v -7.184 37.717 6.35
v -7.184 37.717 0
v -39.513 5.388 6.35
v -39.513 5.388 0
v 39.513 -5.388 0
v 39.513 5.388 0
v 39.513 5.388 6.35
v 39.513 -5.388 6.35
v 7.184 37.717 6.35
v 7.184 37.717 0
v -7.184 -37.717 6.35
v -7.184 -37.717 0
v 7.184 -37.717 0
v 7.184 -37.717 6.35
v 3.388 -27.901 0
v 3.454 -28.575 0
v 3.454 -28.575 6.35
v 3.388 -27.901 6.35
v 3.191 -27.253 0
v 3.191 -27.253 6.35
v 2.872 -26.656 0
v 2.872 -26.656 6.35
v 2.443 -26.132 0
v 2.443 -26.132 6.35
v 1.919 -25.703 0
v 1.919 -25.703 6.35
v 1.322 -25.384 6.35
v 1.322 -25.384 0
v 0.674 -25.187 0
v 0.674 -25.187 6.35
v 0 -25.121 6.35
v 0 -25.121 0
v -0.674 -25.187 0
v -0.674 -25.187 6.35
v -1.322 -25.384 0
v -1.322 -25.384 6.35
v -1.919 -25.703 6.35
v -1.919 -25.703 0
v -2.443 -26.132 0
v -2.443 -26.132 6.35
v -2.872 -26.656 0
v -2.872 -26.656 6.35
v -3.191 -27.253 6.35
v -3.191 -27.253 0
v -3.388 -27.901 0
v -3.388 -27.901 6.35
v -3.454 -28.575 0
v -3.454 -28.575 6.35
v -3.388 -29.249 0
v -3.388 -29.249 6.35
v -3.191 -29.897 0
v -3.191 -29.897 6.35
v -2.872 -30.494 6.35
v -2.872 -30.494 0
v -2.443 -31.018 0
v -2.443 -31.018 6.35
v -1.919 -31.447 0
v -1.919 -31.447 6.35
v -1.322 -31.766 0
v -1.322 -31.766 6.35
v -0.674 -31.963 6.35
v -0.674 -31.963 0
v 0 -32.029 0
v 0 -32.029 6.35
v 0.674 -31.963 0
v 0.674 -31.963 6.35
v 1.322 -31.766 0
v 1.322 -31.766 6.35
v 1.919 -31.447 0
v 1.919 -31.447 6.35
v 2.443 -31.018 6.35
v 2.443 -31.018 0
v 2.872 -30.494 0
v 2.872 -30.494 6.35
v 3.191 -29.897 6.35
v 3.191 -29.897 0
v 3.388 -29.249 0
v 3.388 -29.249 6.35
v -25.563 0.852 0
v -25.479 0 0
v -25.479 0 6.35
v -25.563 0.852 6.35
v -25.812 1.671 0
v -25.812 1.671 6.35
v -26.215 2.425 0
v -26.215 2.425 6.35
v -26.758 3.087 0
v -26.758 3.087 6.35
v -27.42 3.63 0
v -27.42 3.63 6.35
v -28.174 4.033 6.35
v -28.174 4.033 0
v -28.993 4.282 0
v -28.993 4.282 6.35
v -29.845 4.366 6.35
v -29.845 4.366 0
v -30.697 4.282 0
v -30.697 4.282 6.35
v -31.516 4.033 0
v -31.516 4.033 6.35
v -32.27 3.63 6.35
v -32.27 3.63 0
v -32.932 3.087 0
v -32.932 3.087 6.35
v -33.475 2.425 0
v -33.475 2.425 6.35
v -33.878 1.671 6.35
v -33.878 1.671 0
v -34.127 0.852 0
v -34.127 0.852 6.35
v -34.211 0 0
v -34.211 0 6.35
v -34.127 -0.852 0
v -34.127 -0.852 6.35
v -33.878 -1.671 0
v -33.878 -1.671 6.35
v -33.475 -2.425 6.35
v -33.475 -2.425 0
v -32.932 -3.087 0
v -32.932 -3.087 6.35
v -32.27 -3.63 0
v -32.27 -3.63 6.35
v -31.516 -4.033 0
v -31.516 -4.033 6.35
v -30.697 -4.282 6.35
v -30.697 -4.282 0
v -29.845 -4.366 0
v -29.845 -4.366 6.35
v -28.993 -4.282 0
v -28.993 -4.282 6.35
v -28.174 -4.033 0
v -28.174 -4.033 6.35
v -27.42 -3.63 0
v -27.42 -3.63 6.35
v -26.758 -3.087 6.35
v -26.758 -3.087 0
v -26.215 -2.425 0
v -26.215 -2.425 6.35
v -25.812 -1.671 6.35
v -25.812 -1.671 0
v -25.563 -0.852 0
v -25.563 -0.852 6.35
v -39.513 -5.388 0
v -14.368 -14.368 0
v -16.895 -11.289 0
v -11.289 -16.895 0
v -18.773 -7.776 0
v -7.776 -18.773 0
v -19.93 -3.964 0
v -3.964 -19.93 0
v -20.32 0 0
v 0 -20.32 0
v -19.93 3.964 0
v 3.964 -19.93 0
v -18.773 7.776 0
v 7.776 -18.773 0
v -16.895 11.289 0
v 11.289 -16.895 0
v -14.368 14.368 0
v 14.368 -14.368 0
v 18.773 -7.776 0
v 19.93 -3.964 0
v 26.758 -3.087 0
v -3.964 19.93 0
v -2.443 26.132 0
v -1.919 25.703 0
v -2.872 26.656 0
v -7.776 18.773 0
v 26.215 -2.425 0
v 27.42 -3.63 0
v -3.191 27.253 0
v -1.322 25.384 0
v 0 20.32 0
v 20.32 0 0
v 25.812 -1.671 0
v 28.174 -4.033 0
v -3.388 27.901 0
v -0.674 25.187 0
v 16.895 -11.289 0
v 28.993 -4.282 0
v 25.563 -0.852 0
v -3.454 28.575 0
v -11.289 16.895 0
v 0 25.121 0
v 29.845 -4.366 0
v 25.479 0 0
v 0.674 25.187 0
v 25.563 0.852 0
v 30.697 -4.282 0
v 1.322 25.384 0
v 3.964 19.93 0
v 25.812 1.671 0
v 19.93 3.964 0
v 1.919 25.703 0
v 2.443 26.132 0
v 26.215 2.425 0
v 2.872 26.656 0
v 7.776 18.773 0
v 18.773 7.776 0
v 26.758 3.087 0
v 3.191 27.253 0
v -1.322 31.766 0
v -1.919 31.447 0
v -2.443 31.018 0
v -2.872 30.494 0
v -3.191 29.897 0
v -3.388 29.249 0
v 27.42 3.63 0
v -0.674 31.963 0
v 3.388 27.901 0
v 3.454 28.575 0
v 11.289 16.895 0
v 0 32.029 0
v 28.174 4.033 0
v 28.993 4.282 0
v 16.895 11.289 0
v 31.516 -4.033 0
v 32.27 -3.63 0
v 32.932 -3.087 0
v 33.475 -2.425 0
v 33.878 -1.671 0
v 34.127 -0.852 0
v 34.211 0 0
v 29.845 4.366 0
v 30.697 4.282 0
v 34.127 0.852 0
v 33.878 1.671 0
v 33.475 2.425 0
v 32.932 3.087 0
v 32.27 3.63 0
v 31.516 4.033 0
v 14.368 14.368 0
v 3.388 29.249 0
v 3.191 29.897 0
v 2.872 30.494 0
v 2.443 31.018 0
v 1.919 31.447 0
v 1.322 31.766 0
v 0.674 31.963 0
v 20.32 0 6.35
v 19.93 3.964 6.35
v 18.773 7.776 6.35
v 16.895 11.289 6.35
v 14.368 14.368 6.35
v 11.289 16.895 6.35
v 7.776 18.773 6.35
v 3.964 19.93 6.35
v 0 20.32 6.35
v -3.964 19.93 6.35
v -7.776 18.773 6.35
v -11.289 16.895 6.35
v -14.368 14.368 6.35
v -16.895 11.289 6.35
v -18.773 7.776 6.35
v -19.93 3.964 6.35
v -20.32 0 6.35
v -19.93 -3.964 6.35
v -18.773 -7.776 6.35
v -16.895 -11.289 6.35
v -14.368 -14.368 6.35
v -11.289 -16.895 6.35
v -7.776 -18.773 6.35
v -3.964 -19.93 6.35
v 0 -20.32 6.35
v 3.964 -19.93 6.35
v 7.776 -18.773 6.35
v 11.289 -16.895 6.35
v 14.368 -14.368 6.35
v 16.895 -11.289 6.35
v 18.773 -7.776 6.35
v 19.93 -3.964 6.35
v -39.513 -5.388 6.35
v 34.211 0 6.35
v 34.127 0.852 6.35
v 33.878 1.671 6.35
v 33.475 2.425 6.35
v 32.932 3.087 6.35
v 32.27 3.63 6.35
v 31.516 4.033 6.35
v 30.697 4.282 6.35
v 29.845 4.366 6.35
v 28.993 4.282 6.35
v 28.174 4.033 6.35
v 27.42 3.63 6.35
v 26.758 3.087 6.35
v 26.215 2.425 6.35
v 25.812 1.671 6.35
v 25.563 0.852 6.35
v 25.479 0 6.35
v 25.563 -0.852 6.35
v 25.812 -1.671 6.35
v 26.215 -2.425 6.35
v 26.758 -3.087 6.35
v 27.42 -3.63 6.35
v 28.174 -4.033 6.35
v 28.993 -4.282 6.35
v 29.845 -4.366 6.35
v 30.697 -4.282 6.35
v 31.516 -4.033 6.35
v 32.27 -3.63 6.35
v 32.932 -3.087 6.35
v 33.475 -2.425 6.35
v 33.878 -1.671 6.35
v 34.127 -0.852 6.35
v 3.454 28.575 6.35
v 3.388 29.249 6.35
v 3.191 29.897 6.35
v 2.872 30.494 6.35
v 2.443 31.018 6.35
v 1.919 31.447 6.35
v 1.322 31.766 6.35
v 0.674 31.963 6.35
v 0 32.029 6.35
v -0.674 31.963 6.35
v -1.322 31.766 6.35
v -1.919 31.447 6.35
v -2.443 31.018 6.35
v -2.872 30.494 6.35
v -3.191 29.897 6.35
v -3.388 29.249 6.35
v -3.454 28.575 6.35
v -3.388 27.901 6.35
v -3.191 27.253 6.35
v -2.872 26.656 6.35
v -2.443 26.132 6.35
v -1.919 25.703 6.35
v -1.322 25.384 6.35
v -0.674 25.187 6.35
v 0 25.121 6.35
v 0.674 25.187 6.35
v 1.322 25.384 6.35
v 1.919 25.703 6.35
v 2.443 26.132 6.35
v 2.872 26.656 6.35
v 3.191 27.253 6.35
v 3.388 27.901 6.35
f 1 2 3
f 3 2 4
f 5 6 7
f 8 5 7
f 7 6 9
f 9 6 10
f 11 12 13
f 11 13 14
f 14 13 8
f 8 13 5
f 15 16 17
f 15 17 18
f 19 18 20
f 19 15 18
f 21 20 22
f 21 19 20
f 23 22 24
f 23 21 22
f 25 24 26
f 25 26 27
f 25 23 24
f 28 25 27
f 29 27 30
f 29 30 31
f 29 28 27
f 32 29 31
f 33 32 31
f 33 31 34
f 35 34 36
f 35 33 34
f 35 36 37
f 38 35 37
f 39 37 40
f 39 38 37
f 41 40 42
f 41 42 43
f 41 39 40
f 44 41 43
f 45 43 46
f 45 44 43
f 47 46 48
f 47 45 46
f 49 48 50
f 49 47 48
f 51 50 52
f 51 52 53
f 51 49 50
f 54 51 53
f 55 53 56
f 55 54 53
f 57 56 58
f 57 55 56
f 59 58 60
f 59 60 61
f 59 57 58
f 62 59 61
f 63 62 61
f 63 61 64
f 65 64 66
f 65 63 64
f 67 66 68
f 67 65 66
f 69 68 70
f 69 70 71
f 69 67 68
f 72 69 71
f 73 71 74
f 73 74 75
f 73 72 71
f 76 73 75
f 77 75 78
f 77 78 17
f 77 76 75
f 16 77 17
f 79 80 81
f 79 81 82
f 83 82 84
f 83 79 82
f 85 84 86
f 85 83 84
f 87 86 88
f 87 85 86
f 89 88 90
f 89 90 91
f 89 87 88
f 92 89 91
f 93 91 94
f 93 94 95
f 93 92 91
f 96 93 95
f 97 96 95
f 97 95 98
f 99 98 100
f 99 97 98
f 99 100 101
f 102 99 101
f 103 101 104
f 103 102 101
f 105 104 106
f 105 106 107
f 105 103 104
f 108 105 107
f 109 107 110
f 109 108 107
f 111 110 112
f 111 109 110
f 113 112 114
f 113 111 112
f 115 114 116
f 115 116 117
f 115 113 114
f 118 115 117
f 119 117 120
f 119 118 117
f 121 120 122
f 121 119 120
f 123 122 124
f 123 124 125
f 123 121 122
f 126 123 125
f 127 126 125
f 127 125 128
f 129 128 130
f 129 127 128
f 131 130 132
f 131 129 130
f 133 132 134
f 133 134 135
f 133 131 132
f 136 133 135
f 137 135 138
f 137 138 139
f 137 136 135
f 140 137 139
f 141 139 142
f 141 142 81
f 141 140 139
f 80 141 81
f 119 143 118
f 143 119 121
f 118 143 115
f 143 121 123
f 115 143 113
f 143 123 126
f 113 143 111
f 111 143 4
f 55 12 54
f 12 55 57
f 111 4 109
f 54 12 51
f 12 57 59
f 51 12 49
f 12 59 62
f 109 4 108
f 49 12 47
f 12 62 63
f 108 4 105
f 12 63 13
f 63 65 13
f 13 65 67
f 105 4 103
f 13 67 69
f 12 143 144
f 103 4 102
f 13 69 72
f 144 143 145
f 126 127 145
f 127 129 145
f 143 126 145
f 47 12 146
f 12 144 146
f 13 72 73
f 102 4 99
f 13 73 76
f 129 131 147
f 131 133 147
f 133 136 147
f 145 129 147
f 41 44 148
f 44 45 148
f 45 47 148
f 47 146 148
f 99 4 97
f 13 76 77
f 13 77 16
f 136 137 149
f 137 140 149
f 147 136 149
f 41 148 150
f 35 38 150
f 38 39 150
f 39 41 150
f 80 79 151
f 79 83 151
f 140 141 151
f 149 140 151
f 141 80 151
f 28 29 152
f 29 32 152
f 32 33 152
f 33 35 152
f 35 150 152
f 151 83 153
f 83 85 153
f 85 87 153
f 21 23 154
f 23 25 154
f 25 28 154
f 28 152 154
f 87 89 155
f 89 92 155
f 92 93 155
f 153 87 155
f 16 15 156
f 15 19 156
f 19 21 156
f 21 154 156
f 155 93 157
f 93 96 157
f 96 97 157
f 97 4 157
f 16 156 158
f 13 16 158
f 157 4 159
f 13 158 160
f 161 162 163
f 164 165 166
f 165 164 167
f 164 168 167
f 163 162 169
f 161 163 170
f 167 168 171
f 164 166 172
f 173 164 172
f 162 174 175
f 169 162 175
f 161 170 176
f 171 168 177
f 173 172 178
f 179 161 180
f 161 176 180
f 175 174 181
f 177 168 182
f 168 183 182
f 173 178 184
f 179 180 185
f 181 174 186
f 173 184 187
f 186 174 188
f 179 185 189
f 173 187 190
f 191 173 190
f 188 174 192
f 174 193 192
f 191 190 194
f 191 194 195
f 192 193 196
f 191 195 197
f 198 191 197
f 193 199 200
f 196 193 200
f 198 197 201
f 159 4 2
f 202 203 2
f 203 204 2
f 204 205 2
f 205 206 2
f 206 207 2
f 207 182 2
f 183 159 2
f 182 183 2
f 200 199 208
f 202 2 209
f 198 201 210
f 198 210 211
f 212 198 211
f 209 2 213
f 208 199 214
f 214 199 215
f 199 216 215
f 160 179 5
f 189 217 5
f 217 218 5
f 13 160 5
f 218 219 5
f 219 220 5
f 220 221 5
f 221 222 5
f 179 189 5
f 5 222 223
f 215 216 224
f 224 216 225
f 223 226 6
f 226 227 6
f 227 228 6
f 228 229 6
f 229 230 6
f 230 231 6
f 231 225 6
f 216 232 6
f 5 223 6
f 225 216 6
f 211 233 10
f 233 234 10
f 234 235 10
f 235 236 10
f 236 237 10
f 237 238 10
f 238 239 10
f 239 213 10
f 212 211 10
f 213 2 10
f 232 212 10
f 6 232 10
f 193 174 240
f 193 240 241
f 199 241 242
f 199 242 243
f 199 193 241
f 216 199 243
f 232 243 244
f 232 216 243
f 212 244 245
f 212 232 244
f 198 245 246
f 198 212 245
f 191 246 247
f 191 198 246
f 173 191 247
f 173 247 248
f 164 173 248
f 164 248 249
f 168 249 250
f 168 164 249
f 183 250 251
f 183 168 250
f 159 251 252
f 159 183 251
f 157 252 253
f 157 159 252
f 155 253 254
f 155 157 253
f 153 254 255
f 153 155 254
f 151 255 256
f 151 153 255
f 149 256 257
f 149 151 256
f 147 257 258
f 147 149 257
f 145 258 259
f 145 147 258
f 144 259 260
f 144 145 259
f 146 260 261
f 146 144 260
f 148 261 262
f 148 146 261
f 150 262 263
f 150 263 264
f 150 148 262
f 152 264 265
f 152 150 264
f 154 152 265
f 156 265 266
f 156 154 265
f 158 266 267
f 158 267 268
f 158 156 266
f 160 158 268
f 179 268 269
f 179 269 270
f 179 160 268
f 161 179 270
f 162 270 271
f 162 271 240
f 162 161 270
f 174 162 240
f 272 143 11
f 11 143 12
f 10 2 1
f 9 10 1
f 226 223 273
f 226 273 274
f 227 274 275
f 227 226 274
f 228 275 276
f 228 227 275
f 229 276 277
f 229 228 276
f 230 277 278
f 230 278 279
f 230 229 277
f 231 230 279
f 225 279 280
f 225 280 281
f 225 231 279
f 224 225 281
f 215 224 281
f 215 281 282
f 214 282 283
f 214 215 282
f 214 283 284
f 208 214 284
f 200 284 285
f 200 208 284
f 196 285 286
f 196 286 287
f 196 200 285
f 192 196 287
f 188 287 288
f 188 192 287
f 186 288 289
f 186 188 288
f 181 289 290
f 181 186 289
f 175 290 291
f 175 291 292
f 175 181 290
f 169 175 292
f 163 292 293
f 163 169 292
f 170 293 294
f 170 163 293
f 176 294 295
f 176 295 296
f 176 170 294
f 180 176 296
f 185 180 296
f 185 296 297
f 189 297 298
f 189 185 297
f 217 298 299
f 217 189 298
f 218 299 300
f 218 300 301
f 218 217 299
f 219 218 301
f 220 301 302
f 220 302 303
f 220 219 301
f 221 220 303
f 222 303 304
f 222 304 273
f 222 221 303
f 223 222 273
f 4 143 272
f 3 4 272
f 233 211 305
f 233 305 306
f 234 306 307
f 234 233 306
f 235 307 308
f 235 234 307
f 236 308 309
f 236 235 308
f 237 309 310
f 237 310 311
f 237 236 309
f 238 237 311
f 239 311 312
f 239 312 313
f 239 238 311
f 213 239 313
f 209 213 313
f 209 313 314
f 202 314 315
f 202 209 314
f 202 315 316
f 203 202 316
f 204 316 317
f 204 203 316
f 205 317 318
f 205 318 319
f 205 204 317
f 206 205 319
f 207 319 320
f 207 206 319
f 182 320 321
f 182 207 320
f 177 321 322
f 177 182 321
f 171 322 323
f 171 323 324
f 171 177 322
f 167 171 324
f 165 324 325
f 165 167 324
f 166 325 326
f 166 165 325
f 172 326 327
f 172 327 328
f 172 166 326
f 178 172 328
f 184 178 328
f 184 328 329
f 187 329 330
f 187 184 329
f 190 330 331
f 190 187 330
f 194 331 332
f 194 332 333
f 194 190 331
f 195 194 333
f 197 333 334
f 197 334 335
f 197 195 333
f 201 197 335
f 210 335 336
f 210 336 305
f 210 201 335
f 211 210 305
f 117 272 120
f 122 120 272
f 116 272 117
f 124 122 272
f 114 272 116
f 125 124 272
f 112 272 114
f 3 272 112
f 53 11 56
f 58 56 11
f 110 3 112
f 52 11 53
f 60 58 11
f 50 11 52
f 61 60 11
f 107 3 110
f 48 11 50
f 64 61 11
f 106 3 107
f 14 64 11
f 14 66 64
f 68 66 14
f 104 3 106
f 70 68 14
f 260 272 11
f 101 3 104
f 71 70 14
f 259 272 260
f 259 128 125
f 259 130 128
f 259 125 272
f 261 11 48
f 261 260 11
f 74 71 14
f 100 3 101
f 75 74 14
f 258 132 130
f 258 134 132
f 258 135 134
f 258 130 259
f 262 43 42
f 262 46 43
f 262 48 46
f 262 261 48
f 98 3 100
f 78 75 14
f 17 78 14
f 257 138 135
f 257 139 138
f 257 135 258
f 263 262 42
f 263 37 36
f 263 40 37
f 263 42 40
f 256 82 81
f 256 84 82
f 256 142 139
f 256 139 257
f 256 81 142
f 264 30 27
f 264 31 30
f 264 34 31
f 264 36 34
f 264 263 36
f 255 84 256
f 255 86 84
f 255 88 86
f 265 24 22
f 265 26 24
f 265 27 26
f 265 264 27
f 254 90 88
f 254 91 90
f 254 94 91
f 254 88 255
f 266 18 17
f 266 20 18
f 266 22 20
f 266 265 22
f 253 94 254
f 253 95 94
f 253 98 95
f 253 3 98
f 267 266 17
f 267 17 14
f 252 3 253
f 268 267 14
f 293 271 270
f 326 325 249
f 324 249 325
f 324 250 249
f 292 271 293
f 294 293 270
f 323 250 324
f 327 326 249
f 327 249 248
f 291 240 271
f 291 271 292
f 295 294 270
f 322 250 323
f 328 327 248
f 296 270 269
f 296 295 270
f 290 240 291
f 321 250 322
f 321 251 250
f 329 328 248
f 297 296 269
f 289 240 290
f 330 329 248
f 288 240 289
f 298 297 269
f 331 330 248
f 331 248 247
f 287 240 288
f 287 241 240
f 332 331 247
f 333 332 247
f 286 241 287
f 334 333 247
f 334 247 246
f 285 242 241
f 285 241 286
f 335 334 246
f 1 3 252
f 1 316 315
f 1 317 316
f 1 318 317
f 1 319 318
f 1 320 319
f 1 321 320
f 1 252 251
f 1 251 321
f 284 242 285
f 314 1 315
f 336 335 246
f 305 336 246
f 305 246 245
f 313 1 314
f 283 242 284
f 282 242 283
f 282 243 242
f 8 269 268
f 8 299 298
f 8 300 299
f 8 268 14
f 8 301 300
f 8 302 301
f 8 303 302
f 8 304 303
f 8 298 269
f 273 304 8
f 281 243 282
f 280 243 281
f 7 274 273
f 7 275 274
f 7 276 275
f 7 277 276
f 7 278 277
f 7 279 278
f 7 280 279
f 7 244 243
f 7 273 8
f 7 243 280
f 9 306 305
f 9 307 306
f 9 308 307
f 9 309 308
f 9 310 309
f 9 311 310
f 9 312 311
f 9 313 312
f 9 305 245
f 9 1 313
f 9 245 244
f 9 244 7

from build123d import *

# Parameters (mm, degrees)
F0_R     = 3.4544
F0_R_2   = 4.365625
F0_R_3   = 20.32
F1_DEPTH = 6.35
F2_SIZE  = 10.16
F3_SIZE  = 7.62


with BuildPart() as f1:
    # F0 (on Top) → F1 (new body)
    with BuildSketch(Plane.XY):
        Polygon((44.901281, 0), (0, 44.901281), (-44.901281, 0), (0, -44.901281), align=None)
        with Locations((0, -28.575)):
            Circle(F0_R, mode=Mode.SUBTRACT)
        with Locations((-29.845, 0)):
            Circle(F0_R_2, mode=Mode.SUBTRACT)
        Circle(F0_R_3, mode=Mode.SUBTRACT)
        with Locations((0, 28.575)):
            Circle(F0_R, mode=Mode.SUBTRACT)
        with Locations((29.845, 0)):
            Circle(F0_R_2, mode=Mode.SUBTRACT)
    extrude(amount=F1_DEPTH)

    # F2
    f2_edges = [f1.edges().sort_by_distance(p)[0] for p in [
        (0, 44.901281, 3.175),
        (0, -44.901281, 3.175),
    ]]
    chamfer(f2_edges, length=F2_SIZE)

    # F3
    f3_edges = [f1.edges().sort_by_distance(p)[0] for p in [
        (-44.901281, 0, 3.175),
        (44.901281, 0, 3.175),
    ]]
    chamfer(f3_edges, length=F3_SIZE)


solid = f1.part
